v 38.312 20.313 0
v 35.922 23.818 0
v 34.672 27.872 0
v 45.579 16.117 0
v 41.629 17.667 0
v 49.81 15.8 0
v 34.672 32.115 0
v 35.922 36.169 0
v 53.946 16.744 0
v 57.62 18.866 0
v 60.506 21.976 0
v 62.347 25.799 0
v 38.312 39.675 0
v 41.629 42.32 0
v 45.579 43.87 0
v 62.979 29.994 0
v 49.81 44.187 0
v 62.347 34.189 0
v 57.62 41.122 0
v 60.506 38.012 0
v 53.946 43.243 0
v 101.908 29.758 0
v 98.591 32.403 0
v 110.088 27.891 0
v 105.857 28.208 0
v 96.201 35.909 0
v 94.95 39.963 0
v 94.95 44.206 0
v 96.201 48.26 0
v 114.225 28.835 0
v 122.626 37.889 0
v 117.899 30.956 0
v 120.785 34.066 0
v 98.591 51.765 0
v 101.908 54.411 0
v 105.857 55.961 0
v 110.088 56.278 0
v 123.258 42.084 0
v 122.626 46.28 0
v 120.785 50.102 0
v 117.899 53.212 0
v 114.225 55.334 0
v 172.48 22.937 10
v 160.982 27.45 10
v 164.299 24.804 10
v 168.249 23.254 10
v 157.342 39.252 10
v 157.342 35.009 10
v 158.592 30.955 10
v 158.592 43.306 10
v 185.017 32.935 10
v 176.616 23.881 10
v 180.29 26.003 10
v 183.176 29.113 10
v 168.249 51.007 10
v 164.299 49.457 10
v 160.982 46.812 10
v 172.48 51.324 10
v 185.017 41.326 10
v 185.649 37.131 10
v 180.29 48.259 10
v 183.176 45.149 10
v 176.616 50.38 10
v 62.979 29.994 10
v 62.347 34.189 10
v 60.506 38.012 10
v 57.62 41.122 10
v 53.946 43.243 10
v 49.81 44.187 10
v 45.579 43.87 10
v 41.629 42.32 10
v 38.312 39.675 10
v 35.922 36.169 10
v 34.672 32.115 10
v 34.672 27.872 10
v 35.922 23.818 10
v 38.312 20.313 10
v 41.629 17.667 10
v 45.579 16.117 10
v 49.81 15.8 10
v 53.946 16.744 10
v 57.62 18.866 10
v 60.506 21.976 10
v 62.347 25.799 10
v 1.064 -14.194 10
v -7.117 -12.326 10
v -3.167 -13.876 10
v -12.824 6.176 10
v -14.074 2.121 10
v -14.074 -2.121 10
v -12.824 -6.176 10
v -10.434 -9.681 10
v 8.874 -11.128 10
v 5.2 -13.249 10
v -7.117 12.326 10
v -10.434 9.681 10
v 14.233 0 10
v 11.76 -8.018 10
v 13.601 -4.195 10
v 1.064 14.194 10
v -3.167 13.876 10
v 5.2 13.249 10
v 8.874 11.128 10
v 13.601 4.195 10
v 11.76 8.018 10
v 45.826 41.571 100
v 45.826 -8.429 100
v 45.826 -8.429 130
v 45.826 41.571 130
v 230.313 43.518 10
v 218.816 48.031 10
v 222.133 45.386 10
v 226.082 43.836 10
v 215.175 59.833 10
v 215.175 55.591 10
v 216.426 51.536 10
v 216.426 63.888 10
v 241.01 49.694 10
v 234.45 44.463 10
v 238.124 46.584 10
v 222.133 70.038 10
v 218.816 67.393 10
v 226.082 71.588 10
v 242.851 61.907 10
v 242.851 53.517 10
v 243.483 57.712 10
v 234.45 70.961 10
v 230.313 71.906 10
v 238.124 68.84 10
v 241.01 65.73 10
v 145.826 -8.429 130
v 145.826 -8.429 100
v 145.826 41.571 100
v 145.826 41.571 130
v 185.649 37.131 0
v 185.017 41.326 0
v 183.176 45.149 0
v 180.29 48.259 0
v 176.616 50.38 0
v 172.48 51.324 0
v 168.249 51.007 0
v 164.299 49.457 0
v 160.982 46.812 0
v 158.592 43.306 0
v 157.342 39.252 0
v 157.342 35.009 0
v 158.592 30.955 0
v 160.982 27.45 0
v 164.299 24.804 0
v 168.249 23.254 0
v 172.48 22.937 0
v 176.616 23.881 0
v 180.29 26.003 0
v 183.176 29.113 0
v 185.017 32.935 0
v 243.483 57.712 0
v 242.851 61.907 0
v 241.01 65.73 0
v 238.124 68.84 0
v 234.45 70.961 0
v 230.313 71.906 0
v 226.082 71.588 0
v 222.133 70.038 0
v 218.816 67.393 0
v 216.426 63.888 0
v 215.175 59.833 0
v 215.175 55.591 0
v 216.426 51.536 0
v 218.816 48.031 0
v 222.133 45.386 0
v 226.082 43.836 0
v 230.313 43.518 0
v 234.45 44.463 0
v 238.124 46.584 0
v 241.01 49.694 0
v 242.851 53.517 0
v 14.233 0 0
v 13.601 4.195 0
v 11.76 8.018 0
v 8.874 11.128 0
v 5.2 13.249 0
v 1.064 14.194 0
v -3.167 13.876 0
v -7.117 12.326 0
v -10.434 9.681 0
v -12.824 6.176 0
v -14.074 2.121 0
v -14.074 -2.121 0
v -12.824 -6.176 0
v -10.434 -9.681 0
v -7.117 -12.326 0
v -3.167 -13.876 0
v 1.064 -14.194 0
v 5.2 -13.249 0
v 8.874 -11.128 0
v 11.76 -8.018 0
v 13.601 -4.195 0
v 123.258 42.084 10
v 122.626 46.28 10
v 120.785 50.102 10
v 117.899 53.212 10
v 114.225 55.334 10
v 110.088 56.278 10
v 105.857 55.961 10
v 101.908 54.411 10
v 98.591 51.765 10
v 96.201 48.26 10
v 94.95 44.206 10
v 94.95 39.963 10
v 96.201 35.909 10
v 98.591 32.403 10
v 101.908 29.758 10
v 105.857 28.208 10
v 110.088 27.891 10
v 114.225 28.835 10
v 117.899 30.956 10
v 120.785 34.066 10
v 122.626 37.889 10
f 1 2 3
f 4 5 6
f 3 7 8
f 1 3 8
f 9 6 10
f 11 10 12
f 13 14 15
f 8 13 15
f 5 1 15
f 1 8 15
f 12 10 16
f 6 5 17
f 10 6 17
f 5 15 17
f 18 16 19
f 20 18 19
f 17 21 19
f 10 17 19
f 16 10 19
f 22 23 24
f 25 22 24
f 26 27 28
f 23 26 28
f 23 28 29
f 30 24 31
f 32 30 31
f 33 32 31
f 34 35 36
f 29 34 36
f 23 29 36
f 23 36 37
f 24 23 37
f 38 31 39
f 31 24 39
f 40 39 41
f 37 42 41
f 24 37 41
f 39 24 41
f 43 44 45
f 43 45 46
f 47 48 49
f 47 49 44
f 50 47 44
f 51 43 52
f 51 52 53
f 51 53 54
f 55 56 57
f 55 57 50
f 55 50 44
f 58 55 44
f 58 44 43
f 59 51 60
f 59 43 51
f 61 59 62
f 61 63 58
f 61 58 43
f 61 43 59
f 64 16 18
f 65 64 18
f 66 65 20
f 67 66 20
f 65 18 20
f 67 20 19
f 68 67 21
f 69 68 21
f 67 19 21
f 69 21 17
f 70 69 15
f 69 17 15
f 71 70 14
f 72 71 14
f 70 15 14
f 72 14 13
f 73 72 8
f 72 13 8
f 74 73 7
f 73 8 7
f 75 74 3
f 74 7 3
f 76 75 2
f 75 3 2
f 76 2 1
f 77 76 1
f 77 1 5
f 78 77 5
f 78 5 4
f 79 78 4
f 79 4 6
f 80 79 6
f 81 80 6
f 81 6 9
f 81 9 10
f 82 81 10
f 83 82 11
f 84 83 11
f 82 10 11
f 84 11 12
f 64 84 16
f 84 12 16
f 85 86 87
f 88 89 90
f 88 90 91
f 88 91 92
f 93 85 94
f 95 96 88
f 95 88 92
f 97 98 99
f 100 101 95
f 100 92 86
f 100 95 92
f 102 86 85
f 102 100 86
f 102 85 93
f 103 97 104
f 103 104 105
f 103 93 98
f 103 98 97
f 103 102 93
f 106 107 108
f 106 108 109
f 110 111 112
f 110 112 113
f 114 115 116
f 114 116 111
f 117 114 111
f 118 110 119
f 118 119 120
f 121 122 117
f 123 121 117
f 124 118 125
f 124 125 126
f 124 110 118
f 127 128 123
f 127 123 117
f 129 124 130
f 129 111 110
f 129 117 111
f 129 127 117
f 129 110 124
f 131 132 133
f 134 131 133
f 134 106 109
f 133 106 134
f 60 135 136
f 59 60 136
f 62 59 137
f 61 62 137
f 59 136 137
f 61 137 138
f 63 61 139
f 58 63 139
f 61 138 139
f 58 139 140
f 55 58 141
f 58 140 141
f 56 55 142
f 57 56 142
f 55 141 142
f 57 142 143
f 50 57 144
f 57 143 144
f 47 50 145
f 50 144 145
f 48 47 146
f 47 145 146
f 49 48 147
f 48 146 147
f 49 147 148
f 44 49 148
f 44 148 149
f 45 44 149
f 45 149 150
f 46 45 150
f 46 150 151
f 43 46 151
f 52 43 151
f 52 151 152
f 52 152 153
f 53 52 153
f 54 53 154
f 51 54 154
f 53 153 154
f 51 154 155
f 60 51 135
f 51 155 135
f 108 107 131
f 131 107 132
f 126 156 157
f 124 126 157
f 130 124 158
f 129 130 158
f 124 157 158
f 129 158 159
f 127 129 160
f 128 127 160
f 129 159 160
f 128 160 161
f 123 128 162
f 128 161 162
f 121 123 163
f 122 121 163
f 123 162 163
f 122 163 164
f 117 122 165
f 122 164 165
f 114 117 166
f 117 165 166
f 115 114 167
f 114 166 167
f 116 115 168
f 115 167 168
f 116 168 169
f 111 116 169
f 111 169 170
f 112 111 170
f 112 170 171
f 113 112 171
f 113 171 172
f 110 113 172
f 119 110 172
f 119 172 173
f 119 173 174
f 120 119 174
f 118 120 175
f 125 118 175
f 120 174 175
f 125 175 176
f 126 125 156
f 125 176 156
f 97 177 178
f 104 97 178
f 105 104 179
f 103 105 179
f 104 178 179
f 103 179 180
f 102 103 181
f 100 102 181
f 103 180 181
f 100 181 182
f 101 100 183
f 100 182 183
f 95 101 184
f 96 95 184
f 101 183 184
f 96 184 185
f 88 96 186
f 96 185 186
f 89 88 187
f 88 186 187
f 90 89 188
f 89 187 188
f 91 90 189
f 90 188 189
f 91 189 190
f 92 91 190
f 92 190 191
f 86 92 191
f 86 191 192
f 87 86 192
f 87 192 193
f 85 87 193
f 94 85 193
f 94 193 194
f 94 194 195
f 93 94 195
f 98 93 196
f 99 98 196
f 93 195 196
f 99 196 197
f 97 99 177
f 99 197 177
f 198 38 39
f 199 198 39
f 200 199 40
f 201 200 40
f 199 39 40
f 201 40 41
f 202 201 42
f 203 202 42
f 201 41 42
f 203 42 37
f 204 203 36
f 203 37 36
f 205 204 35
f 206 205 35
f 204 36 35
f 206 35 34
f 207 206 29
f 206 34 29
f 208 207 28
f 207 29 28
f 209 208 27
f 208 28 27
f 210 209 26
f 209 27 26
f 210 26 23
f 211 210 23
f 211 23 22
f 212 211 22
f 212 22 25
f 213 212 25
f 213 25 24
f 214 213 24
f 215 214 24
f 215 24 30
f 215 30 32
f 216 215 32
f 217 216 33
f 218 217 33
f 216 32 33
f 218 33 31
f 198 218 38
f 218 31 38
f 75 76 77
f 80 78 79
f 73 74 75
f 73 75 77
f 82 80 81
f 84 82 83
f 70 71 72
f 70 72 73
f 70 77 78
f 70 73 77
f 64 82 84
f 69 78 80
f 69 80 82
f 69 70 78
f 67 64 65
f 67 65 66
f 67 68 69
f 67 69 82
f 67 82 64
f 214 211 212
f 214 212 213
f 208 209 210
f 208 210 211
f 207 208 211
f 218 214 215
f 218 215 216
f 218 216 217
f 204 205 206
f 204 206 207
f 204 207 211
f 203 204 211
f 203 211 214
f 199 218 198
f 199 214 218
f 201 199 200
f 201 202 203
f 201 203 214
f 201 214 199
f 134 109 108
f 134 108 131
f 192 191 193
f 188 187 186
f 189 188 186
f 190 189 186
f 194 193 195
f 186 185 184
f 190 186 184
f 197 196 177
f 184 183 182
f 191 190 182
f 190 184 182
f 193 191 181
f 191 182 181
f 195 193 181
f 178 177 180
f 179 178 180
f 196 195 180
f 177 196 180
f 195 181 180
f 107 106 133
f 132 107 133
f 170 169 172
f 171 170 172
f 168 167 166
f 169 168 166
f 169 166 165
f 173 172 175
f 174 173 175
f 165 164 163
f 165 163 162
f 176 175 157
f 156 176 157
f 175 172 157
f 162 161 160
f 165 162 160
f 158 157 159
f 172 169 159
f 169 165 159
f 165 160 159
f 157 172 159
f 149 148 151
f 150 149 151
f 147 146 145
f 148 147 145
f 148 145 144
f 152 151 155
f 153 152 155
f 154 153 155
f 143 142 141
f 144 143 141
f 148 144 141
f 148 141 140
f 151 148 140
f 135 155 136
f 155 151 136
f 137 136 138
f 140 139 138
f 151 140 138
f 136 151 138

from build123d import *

# Parameters (mm, degrees)
SKETCH_1_R                = 14.233343999
EXTRUDE_1_DEPTH           = 10
PATTERN_CURVE_1_OUTLINE_R = 14.233343999
PATTERN_CURVE_1_DEPTH     = 10
SKETCH_3_W                = 100
SKETCH_3_H                = 50
EXTRUDE_2_DEPTH           = 30


# Read off the part's stored shape, not the designer's step: 曲线阵列1
with BuildPart() as part:
    # 草图1 → 凸台-拉伸1 (new body)
    with BuildSketch(Plane.XY):
        Circle(SKETCH_1_R)
    extrude(amount=EXTRUDE_1_DEPTH)


with BuildPart() as body_2:
    # 曲线阵列1 outline → 曲线阵列1 (new body)
    with BuildSketch(Plane.XY):
        with Locations((229.249642157, 57.71200111)):
            Circle(PATTERN_CURVE_1_OUTLINE_R)
        with Locations((171.415989903, 37.130735449)):
            Circle(PATTERN_CURVE_1_OUTLINE_R)
        with Locations((109.024703037, 42.084293113)):
            Circle(PATTERN_CURVE_1_OUTLINE_R)
        with Locations((48.745932251, 29.993869517)):
            Circle(PATTERN_CURVE_1_OUTLINE_R)
    extrude(amount=PATTERN_CURVE_1_DEPTH)


with BuildPart() as body_3:
    # 草图3 → 凸台-拉伸2 (new body)
    with BuildSketch(Plane.XY.offset(100)):
        with Locations((95.826241383, 16.571381789)):
            Rectangle(SKETCH_3_W, SKETCH_3_H)
    extrude(amount=EXTRUDE_2_DEPTH)


solid = Compound([part.part, body_2.part, body_3.part])
